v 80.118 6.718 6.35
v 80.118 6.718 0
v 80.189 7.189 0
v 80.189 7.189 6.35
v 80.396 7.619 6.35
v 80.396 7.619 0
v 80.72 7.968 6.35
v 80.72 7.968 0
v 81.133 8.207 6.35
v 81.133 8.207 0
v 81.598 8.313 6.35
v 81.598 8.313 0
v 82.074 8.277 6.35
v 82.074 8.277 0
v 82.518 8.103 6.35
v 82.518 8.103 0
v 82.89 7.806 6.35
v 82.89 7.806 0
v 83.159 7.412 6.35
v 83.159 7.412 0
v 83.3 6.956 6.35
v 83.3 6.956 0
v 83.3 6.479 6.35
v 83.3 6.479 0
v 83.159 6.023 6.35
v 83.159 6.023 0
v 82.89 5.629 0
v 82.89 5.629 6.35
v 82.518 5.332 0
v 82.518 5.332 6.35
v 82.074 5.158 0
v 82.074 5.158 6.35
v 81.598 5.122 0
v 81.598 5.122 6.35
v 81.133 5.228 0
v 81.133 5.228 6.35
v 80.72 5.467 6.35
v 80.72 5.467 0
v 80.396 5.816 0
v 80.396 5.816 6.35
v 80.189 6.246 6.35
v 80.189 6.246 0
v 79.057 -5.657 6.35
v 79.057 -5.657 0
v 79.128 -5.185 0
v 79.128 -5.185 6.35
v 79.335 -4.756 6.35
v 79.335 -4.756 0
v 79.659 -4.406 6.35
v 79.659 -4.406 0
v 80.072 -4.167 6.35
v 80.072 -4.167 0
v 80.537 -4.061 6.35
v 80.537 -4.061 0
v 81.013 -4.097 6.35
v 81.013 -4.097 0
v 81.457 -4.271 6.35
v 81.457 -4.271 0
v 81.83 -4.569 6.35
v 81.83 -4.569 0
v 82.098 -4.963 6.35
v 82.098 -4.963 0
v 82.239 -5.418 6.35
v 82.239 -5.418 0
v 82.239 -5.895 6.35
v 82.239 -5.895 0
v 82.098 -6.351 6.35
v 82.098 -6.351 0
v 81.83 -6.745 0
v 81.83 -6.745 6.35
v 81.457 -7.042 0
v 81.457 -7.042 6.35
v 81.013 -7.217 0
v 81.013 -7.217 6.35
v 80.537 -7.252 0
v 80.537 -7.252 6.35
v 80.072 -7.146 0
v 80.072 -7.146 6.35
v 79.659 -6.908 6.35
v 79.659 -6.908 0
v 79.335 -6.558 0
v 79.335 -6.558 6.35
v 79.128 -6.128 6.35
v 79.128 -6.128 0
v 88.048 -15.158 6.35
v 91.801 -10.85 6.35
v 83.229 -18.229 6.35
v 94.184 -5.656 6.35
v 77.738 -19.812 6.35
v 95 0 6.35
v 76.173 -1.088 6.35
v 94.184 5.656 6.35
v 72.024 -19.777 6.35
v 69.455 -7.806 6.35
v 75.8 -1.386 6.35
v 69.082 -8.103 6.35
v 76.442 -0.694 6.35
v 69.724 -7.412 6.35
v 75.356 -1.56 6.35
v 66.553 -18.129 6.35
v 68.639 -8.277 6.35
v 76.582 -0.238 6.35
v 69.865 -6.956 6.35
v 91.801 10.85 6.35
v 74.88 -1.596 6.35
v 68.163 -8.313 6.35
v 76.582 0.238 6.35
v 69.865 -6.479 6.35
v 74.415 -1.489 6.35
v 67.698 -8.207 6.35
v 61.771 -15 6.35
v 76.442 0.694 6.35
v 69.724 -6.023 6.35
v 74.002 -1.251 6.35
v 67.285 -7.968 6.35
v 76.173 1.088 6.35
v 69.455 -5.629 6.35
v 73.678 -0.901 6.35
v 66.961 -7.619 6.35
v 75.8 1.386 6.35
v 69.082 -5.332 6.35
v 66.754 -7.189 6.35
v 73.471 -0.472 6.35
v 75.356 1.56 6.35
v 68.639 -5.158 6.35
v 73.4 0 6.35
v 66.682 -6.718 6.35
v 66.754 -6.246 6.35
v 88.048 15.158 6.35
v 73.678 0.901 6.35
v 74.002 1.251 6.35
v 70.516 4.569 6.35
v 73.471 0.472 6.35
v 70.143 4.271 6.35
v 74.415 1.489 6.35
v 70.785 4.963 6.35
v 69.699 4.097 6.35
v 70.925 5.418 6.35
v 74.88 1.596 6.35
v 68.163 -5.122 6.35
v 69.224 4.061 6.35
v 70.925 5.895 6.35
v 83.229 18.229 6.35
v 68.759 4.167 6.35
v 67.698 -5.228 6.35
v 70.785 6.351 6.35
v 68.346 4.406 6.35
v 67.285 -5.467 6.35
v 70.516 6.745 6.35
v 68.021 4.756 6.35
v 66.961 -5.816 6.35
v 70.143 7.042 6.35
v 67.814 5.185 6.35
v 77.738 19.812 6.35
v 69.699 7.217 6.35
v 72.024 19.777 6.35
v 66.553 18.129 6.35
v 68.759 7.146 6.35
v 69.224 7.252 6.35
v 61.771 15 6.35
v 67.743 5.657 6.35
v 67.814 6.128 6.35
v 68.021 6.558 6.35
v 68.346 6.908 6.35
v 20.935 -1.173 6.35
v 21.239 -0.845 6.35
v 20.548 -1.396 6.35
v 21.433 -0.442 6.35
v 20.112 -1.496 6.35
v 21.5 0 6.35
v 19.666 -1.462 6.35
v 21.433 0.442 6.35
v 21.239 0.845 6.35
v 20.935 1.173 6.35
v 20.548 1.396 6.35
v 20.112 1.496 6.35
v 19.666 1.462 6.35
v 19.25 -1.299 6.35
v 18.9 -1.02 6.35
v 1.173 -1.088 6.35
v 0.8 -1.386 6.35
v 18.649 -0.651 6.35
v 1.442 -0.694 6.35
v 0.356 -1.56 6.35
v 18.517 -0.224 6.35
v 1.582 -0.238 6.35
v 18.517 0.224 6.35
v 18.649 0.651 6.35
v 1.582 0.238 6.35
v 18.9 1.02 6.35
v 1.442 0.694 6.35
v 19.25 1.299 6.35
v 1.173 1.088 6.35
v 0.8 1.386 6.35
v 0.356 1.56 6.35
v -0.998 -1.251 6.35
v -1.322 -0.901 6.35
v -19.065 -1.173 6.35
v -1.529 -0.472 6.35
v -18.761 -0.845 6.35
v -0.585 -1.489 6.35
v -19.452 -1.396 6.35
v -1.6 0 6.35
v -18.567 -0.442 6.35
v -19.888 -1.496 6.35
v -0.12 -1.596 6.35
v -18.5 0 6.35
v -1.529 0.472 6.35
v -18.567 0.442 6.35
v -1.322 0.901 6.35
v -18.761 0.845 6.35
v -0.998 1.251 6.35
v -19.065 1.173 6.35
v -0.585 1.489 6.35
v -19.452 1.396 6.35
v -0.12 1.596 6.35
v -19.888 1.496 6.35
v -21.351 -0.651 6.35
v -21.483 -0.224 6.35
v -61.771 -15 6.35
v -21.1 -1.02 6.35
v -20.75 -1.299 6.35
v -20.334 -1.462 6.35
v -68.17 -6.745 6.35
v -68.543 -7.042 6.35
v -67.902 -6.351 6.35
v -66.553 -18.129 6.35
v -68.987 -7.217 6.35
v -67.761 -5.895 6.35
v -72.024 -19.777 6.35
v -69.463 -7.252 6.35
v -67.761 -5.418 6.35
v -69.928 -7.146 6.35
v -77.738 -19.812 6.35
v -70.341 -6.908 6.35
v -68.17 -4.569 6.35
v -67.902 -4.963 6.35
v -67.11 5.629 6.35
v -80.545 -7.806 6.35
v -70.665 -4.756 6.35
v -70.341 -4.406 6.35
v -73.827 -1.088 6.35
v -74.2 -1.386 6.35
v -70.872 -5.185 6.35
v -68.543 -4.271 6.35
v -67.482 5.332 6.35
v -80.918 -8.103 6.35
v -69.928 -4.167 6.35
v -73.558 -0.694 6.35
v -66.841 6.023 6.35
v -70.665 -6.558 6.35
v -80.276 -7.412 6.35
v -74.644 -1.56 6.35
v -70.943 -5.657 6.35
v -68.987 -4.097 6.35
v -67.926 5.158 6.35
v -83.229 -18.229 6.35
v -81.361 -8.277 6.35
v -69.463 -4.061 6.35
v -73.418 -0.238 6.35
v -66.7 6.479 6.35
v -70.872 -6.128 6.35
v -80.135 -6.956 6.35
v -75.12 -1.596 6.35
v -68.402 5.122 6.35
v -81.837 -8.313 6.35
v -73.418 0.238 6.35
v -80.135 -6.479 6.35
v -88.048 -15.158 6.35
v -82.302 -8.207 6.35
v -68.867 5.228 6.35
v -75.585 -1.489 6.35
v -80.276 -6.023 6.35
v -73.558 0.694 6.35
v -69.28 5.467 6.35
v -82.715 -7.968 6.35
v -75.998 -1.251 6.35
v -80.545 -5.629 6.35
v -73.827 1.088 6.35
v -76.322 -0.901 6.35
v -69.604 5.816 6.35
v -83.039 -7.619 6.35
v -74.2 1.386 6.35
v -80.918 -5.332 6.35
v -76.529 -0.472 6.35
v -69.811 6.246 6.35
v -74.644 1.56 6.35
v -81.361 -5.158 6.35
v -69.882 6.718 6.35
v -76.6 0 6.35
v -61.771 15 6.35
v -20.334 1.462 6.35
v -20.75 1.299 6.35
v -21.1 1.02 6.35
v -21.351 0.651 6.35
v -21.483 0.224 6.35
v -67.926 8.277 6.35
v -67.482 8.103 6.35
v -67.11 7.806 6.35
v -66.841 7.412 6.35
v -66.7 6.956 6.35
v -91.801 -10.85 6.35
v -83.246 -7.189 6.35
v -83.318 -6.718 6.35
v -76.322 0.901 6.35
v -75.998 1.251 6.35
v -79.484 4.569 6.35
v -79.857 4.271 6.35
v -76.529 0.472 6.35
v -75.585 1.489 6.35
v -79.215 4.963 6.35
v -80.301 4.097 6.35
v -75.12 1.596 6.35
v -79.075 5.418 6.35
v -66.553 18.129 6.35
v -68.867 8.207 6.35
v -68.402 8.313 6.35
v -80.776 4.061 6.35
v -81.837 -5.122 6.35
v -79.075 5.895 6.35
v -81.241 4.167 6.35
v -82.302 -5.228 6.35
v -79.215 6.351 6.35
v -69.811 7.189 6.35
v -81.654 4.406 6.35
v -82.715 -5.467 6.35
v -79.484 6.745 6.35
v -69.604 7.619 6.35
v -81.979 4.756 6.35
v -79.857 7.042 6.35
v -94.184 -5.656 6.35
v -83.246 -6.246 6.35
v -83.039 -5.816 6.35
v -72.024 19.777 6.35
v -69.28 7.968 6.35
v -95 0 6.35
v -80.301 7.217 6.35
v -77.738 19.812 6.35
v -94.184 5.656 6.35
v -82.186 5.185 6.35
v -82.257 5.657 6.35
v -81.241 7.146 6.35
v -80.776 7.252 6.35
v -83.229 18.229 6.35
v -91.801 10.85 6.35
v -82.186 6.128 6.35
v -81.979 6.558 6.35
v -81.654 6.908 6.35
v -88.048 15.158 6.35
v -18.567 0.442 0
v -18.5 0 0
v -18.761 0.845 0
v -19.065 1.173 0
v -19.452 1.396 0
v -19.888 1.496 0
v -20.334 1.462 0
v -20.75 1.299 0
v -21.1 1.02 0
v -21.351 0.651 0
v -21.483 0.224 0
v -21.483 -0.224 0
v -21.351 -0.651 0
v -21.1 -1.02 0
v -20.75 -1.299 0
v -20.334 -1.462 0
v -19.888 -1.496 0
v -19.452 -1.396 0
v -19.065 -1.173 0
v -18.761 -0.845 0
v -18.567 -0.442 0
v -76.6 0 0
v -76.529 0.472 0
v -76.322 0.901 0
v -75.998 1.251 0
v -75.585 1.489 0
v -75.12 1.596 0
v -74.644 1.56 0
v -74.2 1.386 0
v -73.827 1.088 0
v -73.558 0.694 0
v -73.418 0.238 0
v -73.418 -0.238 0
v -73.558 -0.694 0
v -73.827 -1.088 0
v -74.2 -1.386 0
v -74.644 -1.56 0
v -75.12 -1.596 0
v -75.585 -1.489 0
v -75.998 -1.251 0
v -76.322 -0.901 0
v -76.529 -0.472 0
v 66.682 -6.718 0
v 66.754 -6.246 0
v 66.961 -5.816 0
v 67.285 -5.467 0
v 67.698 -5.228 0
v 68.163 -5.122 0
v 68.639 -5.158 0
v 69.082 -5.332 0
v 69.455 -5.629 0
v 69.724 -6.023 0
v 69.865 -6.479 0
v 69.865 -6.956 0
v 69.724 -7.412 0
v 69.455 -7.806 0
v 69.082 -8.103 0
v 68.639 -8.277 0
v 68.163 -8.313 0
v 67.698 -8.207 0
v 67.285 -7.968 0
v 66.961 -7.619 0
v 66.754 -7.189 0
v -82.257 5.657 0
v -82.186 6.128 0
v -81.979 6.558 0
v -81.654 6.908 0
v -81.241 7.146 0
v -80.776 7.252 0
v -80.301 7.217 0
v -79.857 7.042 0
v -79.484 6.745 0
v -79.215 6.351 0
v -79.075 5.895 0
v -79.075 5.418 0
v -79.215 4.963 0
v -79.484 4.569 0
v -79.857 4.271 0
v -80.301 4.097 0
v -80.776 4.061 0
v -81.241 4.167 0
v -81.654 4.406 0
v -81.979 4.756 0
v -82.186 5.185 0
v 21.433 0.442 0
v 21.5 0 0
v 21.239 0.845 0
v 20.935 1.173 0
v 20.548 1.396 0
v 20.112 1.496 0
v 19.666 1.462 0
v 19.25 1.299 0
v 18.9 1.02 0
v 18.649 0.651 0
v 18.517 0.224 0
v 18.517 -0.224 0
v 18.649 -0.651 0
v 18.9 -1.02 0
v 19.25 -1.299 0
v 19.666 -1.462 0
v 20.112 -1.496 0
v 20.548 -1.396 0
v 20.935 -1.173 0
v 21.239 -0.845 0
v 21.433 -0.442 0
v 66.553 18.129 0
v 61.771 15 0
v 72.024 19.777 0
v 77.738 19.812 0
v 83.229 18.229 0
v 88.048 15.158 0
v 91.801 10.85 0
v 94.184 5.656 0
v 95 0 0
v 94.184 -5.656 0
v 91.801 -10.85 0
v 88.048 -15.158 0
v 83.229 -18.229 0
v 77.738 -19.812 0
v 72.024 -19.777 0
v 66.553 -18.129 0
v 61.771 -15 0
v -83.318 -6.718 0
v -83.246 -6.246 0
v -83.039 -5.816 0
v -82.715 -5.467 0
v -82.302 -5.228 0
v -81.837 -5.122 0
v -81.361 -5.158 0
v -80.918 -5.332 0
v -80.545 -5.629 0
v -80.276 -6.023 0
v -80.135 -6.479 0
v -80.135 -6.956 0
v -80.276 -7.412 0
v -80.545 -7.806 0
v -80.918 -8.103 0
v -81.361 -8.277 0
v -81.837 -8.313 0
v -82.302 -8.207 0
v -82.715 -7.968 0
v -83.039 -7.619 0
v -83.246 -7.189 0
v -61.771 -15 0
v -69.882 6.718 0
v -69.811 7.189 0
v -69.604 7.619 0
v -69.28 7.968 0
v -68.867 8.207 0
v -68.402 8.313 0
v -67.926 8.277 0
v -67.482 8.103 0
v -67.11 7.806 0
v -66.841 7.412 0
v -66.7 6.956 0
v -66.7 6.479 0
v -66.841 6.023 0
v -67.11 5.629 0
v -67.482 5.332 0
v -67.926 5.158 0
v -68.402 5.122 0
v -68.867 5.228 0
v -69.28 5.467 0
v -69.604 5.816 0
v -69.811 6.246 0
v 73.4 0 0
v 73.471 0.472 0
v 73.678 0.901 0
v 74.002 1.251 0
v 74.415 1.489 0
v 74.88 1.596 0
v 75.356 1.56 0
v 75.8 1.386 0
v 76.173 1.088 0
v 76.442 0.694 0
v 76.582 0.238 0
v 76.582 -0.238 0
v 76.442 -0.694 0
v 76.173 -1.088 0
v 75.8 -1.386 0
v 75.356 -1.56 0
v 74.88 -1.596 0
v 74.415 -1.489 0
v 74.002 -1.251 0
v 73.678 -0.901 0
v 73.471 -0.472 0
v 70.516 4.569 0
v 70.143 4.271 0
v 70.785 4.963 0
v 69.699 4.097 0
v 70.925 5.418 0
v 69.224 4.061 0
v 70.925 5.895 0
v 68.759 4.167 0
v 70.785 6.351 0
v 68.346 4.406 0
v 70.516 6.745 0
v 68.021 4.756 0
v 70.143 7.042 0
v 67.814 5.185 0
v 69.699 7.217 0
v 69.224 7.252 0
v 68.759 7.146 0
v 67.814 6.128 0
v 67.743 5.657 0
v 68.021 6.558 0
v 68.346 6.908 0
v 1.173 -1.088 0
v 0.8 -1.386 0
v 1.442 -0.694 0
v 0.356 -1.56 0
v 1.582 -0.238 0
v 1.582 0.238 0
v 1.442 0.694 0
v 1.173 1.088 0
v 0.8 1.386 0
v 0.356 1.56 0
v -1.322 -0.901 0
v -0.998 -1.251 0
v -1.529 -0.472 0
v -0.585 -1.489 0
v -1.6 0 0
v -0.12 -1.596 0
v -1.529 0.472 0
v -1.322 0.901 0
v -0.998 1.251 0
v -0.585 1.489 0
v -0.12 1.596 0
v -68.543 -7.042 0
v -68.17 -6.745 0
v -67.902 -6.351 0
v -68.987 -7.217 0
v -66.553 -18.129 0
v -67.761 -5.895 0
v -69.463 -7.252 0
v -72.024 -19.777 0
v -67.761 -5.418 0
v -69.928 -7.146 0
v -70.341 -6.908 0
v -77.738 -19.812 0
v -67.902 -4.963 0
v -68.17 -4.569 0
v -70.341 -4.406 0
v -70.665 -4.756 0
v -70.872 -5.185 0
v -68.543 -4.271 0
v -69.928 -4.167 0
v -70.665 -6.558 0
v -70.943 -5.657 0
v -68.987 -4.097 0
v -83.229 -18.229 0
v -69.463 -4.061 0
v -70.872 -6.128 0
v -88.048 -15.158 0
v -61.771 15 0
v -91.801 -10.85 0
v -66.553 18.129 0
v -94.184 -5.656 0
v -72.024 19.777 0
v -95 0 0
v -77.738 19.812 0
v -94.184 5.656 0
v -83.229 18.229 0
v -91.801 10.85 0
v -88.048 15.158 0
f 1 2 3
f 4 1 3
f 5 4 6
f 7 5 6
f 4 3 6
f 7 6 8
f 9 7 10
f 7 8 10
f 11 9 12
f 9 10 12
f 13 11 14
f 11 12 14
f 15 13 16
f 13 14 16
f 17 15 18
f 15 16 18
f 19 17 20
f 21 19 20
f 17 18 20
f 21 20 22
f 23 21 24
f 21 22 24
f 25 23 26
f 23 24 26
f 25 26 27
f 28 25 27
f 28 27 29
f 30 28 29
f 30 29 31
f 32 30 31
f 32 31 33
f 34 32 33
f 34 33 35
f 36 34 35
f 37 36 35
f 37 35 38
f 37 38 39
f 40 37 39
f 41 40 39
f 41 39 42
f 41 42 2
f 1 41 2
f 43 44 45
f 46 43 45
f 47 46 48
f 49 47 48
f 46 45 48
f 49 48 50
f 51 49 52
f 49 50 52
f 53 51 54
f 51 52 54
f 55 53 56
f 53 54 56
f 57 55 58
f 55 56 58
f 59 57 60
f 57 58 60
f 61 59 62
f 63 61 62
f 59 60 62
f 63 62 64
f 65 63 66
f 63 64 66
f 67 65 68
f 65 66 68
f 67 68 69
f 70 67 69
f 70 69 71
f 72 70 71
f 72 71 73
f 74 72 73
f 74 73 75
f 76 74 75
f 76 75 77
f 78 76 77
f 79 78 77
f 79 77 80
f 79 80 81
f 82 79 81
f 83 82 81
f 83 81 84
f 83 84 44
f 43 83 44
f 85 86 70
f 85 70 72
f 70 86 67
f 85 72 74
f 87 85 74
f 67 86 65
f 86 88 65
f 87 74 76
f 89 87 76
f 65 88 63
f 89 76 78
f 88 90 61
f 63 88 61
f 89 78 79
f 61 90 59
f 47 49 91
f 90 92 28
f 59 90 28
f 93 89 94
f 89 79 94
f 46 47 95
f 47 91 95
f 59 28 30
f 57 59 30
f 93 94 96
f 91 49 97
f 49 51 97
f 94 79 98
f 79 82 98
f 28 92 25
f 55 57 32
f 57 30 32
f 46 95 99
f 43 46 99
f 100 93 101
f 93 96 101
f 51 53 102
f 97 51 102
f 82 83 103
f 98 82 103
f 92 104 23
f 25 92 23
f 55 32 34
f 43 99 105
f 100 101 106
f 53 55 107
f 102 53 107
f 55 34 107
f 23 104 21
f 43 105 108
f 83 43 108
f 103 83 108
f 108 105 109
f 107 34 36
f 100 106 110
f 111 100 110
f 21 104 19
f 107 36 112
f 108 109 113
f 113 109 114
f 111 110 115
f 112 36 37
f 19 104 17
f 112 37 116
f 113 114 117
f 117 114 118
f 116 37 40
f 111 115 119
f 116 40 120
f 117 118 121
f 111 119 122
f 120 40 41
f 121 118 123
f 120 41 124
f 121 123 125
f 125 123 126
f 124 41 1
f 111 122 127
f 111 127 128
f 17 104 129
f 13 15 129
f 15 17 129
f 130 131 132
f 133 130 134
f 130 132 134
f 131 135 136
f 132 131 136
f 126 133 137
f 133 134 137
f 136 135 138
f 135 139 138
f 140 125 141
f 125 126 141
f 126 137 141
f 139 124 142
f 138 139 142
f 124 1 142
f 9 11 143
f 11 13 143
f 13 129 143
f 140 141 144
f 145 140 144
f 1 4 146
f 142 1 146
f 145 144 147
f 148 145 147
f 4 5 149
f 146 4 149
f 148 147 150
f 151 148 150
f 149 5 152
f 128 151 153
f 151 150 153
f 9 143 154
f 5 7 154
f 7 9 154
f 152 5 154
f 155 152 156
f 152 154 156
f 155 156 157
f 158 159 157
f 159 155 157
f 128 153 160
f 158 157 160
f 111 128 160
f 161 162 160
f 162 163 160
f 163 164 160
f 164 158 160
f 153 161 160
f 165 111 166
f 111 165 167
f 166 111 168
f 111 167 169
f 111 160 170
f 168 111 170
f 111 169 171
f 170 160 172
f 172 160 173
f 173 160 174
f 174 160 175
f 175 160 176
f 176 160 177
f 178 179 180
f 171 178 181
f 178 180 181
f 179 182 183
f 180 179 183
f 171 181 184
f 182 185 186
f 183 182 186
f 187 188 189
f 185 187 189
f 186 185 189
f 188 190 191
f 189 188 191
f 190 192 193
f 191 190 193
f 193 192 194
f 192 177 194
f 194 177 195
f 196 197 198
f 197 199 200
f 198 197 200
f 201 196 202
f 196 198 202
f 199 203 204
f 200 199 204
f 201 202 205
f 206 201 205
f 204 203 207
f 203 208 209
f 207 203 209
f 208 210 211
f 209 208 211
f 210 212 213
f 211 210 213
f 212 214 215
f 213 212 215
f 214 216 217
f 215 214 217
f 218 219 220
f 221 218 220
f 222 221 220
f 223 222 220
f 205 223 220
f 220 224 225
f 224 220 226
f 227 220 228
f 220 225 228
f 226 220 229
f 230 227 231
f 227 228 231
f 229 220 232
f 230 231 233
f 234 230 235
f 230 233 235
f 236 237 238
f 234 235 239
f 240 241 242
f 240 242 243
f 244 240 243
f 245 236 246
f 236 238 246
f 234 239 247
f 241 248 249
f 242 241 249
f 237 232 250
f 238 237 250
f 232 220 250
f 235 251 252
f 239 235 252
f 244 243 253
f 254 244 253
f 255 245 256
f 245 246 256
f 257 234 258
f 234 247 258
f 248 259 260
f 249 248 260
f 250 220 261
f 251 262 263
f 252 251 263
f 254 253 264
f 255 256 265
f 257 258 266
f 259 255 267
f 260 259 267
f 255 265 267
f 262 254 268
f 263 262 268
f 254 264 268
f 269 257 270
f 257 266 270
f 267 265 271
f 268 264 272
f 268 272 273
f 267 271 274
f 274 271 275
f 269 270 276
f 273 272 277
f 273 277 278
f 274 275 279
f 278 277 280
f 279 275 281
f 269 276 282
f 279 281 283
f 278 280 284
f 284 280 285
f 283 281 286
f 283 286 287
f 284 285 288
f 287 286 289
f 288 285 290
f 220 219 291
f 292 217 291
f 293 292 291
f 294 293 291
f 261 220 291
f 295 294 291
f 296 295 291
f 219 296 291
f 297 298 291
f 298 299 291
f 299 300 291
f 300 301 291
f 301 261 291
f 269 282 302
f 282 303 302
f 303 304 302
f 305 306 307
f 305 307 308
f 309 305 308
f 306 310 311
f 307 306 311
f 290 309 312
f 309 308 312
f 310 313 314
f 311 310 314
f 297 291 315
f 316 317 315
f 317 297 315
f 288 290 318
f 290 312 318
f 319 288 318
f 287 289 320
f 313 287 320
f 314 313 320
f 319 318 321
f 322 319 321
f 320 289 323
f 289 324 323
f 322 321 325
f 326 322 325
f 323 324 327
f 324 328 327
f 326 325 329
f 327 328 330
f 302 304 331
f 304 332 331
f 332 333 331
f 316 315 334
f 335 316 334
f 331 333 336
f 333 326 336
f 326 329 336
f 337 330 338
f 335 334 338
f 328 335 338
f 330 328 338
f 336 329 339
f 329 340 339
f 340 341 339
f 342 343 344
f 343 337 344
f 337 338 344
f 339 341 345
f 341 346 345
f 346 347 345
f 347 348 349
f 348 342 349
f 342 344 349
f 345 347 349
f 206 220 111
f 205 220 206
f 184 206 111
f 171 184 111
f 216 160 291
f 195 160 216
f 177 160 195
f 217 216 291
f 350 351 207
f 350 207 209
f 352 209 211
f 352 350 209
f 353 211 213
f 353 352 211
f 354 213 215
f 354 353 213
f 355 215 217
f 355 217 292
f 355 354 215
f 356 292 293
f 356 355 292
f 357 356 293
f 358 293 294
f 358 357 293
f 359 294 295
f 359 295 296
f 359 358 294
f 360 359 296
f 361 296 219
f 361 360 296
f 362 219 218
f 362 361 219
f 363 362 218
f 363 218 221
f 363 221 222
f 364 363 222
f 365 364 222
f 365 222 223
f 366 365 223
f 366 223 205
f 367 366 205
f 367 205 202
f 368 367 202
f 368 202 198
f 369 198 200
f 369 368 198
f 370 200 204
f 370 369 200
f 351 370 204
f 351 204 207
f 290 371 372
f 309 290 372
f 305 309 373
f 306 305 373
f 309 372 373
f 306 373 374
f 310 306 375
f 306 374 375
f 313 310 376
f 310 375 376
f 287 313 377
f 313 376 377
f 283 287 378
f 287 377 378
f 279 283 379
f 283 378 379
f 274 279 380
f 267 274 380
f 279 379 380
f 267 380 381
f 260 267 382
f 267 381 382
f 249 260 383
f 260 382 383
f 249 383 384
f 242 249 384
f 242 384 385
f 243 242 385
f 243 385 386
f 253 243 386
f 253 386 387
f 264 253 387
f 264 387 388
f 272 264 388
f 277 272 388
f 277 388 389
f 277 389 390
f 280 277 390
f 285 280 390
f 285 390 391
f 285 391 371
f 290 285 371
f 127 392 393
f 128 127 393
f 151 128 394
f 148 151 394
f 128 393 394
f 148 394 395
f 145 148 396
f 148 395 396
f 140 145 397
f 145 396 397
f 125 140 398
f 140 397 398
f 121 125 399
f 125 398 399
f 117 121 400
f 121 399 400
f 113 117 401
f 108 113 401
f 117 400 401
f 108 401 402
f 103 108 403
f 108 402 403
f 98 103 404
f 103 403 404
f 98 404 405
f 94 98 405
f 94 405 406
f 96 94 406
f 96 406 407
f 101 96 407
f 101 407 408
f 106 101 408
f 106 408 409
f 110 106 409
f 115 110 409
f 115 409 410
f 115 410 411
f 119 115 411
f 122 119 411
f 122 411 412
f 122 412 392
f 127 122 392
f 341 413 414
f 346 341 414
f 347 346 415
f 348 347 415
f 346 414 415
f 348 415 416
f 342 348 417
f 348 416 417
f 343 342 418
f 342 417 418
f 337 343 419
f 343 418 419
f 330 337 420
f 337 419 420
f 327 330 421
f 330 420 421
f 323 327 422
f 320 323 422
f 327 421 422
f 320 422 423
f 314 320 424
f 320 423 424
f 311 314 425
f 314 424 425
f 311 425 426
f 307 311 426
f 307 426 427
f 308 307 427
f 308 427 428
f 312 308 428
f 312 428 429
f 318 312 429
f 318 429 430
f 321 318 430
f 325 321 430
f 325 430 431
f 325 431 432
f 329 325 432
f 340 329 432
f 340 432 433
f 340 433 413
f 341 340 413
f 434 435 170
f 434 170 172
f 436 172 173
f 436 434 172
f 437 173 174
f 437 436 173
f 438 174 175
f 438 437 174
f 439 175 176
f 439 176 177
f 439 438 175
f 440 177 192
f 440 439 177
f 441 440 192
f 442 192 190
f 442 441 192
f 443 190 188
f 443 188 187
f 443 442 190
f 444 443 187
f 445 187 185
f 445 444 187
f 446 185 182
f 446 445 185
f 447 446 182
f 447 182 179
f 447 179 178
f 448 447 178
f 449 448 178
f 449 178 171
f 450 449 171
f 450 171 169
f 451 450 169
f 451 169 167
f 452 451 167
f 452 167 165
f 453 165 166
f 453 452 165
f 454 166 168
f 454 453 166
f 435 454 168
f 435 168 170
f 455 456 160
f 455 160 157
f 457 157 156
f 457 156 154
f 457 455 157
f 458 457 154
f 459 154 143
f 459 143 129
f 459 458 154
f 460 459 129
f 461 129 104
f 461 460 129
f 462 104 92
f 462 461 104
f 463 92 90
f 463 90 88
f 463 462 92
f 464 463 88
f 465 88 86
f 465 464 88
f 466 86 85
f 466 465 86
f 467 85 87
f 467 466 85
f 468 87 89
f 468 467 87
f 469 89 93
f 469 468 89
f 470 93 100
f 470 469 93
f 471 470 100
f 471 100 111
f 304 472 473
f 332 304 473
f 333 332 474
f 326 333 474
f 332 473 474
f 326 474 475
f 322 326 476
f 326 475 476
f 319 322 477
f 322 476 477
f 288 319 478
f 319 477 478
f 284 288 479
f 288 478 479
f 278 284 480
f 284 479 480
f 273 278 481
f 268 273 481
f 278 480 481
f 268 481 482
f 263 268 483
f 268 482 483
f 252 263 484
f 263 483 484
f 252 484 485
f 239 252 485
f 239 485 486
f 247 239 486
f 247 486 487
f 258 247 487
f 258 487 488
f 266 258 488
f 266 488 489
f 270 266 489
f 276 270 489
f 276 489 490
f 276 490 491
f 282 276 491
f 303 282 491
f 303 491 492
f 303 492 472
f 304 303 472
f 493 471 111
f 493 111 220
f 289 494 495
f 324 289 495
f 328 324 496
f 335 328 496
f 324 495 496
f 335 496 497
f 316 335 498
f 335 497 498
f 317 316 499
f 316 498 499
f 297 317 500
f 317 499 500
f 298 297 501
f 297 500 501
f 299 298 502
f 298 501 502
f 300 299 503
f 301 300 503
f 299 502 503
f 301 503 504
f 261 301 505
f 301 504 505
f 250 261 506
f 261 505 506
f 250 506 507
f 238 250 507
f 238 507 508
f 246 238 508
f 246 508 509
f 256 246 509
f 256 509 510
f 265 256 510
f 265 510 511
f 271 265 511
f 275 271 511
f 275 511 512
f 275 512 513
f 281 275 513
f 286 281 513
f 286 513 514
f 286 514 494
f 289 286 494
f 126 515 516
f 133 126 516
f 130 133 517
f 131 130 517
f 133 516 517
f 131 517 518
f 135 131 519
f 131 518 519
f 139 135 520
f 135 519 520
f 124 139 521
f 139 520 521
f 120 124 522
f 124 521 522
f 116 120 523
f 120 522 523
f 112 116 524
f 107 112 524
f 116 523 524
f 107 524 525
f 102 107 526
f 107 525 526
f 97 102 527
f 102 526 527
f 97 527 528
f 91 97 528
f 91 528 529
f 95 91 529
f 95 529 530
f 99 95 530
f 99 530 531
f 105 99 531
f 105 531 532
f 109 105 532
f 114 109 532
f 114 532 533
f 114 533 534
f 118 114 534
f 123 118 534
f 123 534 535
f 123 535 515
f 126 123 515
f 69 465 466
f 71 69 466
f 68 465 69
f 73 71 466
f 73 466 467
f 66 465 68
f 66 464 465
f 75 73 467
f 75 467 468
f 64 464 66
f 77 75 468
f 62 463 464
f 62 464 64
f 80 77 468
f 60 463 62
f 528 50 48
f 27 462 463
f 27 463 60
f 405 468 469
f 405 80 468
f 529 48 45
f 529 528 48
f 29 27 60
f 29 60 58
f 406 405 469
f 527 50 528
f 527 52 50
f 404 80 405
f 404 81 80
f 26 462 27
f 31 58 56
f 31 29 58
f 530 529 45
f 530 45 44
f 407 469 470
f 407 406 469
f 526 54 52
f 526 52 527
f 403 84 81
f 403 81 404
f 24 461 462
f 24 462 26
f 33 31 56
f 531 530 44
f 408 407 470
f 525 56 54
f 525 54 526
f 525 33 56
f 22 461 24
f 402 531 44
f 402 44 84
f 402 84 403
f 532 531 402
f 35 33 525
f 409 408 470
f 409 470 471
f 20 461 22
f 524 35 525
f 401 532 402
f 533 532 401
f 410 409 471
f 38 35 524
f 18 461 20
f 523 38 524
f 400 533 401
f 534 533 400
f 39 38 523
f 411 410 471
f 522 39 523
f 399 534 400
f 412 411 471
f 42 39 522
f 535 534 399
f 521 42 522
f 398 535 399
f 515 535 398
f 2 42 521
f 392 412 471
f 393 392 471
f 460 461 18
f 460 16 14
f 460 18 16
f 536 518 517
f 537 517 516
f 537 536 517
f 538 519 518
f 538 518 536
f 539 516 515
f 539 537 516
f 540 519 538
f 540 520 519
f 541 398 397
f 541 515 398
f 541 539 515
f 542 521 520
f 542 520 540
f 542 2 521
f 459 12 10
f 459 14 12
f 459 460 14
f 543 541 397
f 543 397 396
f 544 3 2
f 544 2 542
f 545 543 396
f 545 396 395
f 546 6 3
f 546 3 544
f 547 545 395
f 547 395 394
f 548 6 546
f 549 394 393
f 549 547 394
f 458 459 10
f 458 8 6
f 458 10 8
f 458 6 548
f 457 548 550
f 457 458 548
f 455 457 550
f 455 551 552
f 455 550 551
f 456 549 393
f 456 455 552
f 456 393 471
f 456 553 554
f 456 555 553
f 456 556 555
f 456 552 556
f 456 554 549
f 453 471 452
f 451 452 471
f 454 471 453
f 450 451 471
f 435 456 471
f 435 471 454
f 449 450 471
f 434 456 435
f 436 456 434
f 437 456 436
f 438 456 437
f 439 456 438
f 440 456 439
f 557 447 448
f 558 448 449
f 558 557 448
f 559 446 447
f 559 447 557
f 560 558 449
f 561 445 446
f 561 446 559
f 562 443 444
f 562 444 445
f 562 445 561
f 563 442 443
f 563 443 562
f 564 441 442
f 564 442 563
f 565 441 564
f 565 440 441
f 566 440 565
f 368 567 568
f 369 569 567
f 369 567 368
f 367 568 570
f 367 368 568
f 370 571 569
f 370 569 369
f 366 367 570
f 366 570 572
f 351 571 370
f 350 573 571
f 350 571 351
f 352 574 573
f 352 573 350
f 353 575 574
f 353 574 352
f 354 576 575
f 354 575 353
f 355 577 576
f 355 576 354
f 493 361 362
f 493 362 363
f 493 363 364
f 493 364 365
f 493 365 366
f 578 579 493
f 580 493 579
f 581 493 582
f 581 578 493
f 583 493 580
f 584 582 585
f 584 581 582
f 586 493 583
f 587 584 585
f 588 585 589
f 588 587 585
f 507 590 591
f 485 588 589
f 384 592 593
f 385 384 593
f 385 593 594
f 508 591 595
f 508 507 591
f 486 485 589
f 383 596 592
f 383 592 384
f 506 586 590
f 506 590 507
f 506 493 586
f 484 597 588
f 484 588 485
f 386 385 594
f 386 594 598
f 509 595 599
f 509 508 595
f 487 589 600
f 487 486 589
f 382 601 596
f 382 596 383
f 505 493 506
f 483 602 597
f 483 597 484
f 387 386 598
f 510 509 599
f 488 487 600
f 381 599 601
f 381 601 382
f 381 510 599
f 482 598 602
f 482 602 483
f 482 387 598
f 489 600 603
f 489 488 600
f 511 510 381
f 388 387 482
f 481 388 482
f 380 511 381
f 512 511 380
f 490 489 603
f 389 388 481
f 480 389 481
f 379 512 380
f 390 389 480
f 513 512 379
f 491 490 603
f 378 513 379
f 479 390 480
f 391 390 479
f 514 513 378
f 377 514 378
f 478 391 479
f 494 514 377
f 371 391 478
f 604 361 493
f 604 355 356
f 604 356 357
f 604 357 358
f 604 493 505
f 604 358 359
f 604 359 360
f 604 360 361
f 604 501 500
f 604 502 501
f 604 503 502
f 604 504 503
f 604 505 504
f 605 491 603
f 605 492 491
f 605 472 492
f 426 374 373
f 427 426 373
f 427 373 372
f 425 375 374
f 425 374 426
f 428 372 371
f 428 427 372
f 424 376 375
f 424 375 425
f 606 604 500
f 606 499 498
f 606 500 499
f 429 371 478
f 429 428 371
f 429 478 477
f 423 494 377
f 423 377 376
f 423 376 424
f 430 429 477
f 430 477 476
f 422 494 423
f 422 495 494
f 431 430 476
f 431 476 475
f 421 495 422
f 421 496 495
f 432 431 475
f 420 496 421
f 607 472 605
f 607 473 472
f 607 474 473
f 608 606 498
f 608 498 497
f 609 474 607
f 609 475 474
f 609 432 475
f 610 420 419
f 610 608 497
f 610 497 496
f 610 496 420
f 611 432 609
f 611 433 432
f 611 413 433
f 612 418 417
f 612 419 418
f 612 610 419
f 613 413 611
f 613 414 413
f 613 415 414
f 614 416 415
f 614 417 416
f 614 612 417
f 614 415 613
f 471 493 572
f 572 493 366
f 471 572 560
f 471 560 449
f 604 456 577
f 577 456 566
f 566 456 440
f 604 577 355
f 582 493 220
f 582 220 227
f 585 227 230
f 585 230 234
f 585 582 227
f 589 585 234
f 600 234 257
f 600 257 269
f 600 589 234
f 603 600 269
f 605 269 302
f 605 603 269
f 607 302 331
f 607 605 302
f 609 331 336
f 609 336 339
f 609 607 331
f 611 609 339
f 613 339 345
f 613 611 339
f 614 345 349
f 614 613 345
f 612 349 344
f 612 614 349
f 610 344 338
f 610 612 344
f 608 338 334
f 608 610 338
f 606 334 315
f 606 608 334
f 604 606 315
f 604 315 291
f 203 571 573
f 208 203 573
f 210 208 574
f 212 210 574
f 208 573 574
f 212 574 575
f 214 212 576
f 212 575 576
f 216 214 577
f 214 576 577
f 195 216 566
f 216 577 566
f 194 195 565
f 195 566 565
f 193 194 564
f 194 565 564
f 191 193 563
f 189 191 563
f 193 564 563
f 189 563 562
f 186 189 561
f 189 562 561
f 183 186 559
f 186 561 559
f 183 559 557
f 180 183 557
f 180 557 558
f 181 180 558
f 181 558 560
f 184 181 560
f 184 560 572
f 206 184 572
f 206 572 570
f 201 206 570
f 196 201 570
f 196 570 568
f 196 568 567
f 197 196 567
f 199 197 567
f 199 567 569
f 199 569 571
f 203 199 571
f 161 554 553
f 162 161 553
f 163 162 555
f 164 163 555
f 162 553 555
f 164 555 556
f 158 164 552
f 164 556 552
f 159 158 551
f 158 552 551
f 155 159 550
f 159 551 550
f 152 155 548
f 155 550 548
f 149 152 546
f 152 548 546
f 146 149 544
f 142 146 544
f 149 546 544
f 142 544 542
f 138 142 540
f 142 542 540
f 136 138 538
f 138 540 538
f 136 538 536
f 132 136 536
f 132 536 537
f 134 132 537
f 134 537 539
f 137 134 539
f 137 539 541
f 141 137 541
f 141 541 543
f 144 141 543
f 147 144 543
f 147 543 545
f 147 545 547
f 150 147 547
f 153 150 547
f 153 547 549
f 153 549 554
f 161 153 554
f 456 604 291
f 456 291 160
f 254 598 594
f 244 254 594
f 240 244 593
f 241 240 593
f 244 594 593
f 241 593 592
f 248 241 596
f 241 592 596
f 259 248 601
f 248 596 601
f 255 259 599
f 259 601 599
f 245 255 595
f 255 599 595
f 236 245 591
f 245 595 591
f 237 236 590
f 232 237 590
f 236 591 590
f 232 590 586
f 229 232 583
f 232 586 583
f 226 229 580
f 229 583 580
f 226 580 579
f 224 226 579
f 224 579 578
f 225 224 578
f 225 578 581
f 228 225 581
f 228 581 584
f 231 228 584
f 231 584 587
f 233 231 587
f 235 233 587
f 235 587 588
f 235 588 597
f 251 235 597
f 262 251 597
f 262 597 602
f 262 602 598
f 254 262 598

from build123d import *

# Parameters (mm, degrees)
SKETCH3_R                = 1.5
BOSS_EXTRUDE1_DEPTH      = 6.35
M3_CLEARANCE_HOLE1_D     = 3.2
M3_CLEARANCE_HOLE1_DEPTH = 7.5
M3_CLEARANCE_HOLE1_TIP   = 0.96137699


with BuildPart() as part:
    # Sketch3 → Boss-Extrude1 (new body)
    with BuildSketch(Plane.XY):
        with BuildLine():
            Line((61.771243445, -15), (-61.771243445, -15))
            ThreePointArc((-61.771243445, -15), (-95, 0), (-61.771243445, 15))
            Line((-61.771243445, 15), (61.771243445, 15))
            ThreePointArc((61.771243445, 15), (95, 0), (61.771243445, -15))
        make_face()
        with Locations((-20, 0)):
            Circle(SKETCH3_R, mode=Mode.SUBTRACT)
        with Locations((20, 0)):
            Circle(SKETCH3_R, mode=Mode.SUBTRACT)
    extrude(amount=BOSS_EXTRUDE1_DEPTH)

    # M3 Clearance Hole1
    with Locations(Plane.XY.offset(6.35)):
        with Locations((75, 0), (-75, 0), (-81.717514421, -6.717514421), (-69.343145751, -5.656854249), (-68.282485579, 6.717514421), (-80.656854249, 5.656854249), (0, 0), (81.717514421, 6.717514421), (69.343145751, 5.656854249), (68.282485579, -6.717514421), (80.656854249, -5.656854249)):
            Hole(M3_CLEARANCE_HOLE1_D / 2, depth=M3_CLEARANCE_HOLE1_DEPTH)
            with Locations((0, 0, -(M3_CLEARANCE_HOLE1_DEPTH + M3_CLEARANCE_HOLE1_TIP / 2))):  # 118° drill point
                Cone(0, M3_CLEARANCE_HOLE1_D / 2, M3_CLEARANCE_HOLE1_TIP, mode=Mode.SUBTRACT)


solid = part.part
